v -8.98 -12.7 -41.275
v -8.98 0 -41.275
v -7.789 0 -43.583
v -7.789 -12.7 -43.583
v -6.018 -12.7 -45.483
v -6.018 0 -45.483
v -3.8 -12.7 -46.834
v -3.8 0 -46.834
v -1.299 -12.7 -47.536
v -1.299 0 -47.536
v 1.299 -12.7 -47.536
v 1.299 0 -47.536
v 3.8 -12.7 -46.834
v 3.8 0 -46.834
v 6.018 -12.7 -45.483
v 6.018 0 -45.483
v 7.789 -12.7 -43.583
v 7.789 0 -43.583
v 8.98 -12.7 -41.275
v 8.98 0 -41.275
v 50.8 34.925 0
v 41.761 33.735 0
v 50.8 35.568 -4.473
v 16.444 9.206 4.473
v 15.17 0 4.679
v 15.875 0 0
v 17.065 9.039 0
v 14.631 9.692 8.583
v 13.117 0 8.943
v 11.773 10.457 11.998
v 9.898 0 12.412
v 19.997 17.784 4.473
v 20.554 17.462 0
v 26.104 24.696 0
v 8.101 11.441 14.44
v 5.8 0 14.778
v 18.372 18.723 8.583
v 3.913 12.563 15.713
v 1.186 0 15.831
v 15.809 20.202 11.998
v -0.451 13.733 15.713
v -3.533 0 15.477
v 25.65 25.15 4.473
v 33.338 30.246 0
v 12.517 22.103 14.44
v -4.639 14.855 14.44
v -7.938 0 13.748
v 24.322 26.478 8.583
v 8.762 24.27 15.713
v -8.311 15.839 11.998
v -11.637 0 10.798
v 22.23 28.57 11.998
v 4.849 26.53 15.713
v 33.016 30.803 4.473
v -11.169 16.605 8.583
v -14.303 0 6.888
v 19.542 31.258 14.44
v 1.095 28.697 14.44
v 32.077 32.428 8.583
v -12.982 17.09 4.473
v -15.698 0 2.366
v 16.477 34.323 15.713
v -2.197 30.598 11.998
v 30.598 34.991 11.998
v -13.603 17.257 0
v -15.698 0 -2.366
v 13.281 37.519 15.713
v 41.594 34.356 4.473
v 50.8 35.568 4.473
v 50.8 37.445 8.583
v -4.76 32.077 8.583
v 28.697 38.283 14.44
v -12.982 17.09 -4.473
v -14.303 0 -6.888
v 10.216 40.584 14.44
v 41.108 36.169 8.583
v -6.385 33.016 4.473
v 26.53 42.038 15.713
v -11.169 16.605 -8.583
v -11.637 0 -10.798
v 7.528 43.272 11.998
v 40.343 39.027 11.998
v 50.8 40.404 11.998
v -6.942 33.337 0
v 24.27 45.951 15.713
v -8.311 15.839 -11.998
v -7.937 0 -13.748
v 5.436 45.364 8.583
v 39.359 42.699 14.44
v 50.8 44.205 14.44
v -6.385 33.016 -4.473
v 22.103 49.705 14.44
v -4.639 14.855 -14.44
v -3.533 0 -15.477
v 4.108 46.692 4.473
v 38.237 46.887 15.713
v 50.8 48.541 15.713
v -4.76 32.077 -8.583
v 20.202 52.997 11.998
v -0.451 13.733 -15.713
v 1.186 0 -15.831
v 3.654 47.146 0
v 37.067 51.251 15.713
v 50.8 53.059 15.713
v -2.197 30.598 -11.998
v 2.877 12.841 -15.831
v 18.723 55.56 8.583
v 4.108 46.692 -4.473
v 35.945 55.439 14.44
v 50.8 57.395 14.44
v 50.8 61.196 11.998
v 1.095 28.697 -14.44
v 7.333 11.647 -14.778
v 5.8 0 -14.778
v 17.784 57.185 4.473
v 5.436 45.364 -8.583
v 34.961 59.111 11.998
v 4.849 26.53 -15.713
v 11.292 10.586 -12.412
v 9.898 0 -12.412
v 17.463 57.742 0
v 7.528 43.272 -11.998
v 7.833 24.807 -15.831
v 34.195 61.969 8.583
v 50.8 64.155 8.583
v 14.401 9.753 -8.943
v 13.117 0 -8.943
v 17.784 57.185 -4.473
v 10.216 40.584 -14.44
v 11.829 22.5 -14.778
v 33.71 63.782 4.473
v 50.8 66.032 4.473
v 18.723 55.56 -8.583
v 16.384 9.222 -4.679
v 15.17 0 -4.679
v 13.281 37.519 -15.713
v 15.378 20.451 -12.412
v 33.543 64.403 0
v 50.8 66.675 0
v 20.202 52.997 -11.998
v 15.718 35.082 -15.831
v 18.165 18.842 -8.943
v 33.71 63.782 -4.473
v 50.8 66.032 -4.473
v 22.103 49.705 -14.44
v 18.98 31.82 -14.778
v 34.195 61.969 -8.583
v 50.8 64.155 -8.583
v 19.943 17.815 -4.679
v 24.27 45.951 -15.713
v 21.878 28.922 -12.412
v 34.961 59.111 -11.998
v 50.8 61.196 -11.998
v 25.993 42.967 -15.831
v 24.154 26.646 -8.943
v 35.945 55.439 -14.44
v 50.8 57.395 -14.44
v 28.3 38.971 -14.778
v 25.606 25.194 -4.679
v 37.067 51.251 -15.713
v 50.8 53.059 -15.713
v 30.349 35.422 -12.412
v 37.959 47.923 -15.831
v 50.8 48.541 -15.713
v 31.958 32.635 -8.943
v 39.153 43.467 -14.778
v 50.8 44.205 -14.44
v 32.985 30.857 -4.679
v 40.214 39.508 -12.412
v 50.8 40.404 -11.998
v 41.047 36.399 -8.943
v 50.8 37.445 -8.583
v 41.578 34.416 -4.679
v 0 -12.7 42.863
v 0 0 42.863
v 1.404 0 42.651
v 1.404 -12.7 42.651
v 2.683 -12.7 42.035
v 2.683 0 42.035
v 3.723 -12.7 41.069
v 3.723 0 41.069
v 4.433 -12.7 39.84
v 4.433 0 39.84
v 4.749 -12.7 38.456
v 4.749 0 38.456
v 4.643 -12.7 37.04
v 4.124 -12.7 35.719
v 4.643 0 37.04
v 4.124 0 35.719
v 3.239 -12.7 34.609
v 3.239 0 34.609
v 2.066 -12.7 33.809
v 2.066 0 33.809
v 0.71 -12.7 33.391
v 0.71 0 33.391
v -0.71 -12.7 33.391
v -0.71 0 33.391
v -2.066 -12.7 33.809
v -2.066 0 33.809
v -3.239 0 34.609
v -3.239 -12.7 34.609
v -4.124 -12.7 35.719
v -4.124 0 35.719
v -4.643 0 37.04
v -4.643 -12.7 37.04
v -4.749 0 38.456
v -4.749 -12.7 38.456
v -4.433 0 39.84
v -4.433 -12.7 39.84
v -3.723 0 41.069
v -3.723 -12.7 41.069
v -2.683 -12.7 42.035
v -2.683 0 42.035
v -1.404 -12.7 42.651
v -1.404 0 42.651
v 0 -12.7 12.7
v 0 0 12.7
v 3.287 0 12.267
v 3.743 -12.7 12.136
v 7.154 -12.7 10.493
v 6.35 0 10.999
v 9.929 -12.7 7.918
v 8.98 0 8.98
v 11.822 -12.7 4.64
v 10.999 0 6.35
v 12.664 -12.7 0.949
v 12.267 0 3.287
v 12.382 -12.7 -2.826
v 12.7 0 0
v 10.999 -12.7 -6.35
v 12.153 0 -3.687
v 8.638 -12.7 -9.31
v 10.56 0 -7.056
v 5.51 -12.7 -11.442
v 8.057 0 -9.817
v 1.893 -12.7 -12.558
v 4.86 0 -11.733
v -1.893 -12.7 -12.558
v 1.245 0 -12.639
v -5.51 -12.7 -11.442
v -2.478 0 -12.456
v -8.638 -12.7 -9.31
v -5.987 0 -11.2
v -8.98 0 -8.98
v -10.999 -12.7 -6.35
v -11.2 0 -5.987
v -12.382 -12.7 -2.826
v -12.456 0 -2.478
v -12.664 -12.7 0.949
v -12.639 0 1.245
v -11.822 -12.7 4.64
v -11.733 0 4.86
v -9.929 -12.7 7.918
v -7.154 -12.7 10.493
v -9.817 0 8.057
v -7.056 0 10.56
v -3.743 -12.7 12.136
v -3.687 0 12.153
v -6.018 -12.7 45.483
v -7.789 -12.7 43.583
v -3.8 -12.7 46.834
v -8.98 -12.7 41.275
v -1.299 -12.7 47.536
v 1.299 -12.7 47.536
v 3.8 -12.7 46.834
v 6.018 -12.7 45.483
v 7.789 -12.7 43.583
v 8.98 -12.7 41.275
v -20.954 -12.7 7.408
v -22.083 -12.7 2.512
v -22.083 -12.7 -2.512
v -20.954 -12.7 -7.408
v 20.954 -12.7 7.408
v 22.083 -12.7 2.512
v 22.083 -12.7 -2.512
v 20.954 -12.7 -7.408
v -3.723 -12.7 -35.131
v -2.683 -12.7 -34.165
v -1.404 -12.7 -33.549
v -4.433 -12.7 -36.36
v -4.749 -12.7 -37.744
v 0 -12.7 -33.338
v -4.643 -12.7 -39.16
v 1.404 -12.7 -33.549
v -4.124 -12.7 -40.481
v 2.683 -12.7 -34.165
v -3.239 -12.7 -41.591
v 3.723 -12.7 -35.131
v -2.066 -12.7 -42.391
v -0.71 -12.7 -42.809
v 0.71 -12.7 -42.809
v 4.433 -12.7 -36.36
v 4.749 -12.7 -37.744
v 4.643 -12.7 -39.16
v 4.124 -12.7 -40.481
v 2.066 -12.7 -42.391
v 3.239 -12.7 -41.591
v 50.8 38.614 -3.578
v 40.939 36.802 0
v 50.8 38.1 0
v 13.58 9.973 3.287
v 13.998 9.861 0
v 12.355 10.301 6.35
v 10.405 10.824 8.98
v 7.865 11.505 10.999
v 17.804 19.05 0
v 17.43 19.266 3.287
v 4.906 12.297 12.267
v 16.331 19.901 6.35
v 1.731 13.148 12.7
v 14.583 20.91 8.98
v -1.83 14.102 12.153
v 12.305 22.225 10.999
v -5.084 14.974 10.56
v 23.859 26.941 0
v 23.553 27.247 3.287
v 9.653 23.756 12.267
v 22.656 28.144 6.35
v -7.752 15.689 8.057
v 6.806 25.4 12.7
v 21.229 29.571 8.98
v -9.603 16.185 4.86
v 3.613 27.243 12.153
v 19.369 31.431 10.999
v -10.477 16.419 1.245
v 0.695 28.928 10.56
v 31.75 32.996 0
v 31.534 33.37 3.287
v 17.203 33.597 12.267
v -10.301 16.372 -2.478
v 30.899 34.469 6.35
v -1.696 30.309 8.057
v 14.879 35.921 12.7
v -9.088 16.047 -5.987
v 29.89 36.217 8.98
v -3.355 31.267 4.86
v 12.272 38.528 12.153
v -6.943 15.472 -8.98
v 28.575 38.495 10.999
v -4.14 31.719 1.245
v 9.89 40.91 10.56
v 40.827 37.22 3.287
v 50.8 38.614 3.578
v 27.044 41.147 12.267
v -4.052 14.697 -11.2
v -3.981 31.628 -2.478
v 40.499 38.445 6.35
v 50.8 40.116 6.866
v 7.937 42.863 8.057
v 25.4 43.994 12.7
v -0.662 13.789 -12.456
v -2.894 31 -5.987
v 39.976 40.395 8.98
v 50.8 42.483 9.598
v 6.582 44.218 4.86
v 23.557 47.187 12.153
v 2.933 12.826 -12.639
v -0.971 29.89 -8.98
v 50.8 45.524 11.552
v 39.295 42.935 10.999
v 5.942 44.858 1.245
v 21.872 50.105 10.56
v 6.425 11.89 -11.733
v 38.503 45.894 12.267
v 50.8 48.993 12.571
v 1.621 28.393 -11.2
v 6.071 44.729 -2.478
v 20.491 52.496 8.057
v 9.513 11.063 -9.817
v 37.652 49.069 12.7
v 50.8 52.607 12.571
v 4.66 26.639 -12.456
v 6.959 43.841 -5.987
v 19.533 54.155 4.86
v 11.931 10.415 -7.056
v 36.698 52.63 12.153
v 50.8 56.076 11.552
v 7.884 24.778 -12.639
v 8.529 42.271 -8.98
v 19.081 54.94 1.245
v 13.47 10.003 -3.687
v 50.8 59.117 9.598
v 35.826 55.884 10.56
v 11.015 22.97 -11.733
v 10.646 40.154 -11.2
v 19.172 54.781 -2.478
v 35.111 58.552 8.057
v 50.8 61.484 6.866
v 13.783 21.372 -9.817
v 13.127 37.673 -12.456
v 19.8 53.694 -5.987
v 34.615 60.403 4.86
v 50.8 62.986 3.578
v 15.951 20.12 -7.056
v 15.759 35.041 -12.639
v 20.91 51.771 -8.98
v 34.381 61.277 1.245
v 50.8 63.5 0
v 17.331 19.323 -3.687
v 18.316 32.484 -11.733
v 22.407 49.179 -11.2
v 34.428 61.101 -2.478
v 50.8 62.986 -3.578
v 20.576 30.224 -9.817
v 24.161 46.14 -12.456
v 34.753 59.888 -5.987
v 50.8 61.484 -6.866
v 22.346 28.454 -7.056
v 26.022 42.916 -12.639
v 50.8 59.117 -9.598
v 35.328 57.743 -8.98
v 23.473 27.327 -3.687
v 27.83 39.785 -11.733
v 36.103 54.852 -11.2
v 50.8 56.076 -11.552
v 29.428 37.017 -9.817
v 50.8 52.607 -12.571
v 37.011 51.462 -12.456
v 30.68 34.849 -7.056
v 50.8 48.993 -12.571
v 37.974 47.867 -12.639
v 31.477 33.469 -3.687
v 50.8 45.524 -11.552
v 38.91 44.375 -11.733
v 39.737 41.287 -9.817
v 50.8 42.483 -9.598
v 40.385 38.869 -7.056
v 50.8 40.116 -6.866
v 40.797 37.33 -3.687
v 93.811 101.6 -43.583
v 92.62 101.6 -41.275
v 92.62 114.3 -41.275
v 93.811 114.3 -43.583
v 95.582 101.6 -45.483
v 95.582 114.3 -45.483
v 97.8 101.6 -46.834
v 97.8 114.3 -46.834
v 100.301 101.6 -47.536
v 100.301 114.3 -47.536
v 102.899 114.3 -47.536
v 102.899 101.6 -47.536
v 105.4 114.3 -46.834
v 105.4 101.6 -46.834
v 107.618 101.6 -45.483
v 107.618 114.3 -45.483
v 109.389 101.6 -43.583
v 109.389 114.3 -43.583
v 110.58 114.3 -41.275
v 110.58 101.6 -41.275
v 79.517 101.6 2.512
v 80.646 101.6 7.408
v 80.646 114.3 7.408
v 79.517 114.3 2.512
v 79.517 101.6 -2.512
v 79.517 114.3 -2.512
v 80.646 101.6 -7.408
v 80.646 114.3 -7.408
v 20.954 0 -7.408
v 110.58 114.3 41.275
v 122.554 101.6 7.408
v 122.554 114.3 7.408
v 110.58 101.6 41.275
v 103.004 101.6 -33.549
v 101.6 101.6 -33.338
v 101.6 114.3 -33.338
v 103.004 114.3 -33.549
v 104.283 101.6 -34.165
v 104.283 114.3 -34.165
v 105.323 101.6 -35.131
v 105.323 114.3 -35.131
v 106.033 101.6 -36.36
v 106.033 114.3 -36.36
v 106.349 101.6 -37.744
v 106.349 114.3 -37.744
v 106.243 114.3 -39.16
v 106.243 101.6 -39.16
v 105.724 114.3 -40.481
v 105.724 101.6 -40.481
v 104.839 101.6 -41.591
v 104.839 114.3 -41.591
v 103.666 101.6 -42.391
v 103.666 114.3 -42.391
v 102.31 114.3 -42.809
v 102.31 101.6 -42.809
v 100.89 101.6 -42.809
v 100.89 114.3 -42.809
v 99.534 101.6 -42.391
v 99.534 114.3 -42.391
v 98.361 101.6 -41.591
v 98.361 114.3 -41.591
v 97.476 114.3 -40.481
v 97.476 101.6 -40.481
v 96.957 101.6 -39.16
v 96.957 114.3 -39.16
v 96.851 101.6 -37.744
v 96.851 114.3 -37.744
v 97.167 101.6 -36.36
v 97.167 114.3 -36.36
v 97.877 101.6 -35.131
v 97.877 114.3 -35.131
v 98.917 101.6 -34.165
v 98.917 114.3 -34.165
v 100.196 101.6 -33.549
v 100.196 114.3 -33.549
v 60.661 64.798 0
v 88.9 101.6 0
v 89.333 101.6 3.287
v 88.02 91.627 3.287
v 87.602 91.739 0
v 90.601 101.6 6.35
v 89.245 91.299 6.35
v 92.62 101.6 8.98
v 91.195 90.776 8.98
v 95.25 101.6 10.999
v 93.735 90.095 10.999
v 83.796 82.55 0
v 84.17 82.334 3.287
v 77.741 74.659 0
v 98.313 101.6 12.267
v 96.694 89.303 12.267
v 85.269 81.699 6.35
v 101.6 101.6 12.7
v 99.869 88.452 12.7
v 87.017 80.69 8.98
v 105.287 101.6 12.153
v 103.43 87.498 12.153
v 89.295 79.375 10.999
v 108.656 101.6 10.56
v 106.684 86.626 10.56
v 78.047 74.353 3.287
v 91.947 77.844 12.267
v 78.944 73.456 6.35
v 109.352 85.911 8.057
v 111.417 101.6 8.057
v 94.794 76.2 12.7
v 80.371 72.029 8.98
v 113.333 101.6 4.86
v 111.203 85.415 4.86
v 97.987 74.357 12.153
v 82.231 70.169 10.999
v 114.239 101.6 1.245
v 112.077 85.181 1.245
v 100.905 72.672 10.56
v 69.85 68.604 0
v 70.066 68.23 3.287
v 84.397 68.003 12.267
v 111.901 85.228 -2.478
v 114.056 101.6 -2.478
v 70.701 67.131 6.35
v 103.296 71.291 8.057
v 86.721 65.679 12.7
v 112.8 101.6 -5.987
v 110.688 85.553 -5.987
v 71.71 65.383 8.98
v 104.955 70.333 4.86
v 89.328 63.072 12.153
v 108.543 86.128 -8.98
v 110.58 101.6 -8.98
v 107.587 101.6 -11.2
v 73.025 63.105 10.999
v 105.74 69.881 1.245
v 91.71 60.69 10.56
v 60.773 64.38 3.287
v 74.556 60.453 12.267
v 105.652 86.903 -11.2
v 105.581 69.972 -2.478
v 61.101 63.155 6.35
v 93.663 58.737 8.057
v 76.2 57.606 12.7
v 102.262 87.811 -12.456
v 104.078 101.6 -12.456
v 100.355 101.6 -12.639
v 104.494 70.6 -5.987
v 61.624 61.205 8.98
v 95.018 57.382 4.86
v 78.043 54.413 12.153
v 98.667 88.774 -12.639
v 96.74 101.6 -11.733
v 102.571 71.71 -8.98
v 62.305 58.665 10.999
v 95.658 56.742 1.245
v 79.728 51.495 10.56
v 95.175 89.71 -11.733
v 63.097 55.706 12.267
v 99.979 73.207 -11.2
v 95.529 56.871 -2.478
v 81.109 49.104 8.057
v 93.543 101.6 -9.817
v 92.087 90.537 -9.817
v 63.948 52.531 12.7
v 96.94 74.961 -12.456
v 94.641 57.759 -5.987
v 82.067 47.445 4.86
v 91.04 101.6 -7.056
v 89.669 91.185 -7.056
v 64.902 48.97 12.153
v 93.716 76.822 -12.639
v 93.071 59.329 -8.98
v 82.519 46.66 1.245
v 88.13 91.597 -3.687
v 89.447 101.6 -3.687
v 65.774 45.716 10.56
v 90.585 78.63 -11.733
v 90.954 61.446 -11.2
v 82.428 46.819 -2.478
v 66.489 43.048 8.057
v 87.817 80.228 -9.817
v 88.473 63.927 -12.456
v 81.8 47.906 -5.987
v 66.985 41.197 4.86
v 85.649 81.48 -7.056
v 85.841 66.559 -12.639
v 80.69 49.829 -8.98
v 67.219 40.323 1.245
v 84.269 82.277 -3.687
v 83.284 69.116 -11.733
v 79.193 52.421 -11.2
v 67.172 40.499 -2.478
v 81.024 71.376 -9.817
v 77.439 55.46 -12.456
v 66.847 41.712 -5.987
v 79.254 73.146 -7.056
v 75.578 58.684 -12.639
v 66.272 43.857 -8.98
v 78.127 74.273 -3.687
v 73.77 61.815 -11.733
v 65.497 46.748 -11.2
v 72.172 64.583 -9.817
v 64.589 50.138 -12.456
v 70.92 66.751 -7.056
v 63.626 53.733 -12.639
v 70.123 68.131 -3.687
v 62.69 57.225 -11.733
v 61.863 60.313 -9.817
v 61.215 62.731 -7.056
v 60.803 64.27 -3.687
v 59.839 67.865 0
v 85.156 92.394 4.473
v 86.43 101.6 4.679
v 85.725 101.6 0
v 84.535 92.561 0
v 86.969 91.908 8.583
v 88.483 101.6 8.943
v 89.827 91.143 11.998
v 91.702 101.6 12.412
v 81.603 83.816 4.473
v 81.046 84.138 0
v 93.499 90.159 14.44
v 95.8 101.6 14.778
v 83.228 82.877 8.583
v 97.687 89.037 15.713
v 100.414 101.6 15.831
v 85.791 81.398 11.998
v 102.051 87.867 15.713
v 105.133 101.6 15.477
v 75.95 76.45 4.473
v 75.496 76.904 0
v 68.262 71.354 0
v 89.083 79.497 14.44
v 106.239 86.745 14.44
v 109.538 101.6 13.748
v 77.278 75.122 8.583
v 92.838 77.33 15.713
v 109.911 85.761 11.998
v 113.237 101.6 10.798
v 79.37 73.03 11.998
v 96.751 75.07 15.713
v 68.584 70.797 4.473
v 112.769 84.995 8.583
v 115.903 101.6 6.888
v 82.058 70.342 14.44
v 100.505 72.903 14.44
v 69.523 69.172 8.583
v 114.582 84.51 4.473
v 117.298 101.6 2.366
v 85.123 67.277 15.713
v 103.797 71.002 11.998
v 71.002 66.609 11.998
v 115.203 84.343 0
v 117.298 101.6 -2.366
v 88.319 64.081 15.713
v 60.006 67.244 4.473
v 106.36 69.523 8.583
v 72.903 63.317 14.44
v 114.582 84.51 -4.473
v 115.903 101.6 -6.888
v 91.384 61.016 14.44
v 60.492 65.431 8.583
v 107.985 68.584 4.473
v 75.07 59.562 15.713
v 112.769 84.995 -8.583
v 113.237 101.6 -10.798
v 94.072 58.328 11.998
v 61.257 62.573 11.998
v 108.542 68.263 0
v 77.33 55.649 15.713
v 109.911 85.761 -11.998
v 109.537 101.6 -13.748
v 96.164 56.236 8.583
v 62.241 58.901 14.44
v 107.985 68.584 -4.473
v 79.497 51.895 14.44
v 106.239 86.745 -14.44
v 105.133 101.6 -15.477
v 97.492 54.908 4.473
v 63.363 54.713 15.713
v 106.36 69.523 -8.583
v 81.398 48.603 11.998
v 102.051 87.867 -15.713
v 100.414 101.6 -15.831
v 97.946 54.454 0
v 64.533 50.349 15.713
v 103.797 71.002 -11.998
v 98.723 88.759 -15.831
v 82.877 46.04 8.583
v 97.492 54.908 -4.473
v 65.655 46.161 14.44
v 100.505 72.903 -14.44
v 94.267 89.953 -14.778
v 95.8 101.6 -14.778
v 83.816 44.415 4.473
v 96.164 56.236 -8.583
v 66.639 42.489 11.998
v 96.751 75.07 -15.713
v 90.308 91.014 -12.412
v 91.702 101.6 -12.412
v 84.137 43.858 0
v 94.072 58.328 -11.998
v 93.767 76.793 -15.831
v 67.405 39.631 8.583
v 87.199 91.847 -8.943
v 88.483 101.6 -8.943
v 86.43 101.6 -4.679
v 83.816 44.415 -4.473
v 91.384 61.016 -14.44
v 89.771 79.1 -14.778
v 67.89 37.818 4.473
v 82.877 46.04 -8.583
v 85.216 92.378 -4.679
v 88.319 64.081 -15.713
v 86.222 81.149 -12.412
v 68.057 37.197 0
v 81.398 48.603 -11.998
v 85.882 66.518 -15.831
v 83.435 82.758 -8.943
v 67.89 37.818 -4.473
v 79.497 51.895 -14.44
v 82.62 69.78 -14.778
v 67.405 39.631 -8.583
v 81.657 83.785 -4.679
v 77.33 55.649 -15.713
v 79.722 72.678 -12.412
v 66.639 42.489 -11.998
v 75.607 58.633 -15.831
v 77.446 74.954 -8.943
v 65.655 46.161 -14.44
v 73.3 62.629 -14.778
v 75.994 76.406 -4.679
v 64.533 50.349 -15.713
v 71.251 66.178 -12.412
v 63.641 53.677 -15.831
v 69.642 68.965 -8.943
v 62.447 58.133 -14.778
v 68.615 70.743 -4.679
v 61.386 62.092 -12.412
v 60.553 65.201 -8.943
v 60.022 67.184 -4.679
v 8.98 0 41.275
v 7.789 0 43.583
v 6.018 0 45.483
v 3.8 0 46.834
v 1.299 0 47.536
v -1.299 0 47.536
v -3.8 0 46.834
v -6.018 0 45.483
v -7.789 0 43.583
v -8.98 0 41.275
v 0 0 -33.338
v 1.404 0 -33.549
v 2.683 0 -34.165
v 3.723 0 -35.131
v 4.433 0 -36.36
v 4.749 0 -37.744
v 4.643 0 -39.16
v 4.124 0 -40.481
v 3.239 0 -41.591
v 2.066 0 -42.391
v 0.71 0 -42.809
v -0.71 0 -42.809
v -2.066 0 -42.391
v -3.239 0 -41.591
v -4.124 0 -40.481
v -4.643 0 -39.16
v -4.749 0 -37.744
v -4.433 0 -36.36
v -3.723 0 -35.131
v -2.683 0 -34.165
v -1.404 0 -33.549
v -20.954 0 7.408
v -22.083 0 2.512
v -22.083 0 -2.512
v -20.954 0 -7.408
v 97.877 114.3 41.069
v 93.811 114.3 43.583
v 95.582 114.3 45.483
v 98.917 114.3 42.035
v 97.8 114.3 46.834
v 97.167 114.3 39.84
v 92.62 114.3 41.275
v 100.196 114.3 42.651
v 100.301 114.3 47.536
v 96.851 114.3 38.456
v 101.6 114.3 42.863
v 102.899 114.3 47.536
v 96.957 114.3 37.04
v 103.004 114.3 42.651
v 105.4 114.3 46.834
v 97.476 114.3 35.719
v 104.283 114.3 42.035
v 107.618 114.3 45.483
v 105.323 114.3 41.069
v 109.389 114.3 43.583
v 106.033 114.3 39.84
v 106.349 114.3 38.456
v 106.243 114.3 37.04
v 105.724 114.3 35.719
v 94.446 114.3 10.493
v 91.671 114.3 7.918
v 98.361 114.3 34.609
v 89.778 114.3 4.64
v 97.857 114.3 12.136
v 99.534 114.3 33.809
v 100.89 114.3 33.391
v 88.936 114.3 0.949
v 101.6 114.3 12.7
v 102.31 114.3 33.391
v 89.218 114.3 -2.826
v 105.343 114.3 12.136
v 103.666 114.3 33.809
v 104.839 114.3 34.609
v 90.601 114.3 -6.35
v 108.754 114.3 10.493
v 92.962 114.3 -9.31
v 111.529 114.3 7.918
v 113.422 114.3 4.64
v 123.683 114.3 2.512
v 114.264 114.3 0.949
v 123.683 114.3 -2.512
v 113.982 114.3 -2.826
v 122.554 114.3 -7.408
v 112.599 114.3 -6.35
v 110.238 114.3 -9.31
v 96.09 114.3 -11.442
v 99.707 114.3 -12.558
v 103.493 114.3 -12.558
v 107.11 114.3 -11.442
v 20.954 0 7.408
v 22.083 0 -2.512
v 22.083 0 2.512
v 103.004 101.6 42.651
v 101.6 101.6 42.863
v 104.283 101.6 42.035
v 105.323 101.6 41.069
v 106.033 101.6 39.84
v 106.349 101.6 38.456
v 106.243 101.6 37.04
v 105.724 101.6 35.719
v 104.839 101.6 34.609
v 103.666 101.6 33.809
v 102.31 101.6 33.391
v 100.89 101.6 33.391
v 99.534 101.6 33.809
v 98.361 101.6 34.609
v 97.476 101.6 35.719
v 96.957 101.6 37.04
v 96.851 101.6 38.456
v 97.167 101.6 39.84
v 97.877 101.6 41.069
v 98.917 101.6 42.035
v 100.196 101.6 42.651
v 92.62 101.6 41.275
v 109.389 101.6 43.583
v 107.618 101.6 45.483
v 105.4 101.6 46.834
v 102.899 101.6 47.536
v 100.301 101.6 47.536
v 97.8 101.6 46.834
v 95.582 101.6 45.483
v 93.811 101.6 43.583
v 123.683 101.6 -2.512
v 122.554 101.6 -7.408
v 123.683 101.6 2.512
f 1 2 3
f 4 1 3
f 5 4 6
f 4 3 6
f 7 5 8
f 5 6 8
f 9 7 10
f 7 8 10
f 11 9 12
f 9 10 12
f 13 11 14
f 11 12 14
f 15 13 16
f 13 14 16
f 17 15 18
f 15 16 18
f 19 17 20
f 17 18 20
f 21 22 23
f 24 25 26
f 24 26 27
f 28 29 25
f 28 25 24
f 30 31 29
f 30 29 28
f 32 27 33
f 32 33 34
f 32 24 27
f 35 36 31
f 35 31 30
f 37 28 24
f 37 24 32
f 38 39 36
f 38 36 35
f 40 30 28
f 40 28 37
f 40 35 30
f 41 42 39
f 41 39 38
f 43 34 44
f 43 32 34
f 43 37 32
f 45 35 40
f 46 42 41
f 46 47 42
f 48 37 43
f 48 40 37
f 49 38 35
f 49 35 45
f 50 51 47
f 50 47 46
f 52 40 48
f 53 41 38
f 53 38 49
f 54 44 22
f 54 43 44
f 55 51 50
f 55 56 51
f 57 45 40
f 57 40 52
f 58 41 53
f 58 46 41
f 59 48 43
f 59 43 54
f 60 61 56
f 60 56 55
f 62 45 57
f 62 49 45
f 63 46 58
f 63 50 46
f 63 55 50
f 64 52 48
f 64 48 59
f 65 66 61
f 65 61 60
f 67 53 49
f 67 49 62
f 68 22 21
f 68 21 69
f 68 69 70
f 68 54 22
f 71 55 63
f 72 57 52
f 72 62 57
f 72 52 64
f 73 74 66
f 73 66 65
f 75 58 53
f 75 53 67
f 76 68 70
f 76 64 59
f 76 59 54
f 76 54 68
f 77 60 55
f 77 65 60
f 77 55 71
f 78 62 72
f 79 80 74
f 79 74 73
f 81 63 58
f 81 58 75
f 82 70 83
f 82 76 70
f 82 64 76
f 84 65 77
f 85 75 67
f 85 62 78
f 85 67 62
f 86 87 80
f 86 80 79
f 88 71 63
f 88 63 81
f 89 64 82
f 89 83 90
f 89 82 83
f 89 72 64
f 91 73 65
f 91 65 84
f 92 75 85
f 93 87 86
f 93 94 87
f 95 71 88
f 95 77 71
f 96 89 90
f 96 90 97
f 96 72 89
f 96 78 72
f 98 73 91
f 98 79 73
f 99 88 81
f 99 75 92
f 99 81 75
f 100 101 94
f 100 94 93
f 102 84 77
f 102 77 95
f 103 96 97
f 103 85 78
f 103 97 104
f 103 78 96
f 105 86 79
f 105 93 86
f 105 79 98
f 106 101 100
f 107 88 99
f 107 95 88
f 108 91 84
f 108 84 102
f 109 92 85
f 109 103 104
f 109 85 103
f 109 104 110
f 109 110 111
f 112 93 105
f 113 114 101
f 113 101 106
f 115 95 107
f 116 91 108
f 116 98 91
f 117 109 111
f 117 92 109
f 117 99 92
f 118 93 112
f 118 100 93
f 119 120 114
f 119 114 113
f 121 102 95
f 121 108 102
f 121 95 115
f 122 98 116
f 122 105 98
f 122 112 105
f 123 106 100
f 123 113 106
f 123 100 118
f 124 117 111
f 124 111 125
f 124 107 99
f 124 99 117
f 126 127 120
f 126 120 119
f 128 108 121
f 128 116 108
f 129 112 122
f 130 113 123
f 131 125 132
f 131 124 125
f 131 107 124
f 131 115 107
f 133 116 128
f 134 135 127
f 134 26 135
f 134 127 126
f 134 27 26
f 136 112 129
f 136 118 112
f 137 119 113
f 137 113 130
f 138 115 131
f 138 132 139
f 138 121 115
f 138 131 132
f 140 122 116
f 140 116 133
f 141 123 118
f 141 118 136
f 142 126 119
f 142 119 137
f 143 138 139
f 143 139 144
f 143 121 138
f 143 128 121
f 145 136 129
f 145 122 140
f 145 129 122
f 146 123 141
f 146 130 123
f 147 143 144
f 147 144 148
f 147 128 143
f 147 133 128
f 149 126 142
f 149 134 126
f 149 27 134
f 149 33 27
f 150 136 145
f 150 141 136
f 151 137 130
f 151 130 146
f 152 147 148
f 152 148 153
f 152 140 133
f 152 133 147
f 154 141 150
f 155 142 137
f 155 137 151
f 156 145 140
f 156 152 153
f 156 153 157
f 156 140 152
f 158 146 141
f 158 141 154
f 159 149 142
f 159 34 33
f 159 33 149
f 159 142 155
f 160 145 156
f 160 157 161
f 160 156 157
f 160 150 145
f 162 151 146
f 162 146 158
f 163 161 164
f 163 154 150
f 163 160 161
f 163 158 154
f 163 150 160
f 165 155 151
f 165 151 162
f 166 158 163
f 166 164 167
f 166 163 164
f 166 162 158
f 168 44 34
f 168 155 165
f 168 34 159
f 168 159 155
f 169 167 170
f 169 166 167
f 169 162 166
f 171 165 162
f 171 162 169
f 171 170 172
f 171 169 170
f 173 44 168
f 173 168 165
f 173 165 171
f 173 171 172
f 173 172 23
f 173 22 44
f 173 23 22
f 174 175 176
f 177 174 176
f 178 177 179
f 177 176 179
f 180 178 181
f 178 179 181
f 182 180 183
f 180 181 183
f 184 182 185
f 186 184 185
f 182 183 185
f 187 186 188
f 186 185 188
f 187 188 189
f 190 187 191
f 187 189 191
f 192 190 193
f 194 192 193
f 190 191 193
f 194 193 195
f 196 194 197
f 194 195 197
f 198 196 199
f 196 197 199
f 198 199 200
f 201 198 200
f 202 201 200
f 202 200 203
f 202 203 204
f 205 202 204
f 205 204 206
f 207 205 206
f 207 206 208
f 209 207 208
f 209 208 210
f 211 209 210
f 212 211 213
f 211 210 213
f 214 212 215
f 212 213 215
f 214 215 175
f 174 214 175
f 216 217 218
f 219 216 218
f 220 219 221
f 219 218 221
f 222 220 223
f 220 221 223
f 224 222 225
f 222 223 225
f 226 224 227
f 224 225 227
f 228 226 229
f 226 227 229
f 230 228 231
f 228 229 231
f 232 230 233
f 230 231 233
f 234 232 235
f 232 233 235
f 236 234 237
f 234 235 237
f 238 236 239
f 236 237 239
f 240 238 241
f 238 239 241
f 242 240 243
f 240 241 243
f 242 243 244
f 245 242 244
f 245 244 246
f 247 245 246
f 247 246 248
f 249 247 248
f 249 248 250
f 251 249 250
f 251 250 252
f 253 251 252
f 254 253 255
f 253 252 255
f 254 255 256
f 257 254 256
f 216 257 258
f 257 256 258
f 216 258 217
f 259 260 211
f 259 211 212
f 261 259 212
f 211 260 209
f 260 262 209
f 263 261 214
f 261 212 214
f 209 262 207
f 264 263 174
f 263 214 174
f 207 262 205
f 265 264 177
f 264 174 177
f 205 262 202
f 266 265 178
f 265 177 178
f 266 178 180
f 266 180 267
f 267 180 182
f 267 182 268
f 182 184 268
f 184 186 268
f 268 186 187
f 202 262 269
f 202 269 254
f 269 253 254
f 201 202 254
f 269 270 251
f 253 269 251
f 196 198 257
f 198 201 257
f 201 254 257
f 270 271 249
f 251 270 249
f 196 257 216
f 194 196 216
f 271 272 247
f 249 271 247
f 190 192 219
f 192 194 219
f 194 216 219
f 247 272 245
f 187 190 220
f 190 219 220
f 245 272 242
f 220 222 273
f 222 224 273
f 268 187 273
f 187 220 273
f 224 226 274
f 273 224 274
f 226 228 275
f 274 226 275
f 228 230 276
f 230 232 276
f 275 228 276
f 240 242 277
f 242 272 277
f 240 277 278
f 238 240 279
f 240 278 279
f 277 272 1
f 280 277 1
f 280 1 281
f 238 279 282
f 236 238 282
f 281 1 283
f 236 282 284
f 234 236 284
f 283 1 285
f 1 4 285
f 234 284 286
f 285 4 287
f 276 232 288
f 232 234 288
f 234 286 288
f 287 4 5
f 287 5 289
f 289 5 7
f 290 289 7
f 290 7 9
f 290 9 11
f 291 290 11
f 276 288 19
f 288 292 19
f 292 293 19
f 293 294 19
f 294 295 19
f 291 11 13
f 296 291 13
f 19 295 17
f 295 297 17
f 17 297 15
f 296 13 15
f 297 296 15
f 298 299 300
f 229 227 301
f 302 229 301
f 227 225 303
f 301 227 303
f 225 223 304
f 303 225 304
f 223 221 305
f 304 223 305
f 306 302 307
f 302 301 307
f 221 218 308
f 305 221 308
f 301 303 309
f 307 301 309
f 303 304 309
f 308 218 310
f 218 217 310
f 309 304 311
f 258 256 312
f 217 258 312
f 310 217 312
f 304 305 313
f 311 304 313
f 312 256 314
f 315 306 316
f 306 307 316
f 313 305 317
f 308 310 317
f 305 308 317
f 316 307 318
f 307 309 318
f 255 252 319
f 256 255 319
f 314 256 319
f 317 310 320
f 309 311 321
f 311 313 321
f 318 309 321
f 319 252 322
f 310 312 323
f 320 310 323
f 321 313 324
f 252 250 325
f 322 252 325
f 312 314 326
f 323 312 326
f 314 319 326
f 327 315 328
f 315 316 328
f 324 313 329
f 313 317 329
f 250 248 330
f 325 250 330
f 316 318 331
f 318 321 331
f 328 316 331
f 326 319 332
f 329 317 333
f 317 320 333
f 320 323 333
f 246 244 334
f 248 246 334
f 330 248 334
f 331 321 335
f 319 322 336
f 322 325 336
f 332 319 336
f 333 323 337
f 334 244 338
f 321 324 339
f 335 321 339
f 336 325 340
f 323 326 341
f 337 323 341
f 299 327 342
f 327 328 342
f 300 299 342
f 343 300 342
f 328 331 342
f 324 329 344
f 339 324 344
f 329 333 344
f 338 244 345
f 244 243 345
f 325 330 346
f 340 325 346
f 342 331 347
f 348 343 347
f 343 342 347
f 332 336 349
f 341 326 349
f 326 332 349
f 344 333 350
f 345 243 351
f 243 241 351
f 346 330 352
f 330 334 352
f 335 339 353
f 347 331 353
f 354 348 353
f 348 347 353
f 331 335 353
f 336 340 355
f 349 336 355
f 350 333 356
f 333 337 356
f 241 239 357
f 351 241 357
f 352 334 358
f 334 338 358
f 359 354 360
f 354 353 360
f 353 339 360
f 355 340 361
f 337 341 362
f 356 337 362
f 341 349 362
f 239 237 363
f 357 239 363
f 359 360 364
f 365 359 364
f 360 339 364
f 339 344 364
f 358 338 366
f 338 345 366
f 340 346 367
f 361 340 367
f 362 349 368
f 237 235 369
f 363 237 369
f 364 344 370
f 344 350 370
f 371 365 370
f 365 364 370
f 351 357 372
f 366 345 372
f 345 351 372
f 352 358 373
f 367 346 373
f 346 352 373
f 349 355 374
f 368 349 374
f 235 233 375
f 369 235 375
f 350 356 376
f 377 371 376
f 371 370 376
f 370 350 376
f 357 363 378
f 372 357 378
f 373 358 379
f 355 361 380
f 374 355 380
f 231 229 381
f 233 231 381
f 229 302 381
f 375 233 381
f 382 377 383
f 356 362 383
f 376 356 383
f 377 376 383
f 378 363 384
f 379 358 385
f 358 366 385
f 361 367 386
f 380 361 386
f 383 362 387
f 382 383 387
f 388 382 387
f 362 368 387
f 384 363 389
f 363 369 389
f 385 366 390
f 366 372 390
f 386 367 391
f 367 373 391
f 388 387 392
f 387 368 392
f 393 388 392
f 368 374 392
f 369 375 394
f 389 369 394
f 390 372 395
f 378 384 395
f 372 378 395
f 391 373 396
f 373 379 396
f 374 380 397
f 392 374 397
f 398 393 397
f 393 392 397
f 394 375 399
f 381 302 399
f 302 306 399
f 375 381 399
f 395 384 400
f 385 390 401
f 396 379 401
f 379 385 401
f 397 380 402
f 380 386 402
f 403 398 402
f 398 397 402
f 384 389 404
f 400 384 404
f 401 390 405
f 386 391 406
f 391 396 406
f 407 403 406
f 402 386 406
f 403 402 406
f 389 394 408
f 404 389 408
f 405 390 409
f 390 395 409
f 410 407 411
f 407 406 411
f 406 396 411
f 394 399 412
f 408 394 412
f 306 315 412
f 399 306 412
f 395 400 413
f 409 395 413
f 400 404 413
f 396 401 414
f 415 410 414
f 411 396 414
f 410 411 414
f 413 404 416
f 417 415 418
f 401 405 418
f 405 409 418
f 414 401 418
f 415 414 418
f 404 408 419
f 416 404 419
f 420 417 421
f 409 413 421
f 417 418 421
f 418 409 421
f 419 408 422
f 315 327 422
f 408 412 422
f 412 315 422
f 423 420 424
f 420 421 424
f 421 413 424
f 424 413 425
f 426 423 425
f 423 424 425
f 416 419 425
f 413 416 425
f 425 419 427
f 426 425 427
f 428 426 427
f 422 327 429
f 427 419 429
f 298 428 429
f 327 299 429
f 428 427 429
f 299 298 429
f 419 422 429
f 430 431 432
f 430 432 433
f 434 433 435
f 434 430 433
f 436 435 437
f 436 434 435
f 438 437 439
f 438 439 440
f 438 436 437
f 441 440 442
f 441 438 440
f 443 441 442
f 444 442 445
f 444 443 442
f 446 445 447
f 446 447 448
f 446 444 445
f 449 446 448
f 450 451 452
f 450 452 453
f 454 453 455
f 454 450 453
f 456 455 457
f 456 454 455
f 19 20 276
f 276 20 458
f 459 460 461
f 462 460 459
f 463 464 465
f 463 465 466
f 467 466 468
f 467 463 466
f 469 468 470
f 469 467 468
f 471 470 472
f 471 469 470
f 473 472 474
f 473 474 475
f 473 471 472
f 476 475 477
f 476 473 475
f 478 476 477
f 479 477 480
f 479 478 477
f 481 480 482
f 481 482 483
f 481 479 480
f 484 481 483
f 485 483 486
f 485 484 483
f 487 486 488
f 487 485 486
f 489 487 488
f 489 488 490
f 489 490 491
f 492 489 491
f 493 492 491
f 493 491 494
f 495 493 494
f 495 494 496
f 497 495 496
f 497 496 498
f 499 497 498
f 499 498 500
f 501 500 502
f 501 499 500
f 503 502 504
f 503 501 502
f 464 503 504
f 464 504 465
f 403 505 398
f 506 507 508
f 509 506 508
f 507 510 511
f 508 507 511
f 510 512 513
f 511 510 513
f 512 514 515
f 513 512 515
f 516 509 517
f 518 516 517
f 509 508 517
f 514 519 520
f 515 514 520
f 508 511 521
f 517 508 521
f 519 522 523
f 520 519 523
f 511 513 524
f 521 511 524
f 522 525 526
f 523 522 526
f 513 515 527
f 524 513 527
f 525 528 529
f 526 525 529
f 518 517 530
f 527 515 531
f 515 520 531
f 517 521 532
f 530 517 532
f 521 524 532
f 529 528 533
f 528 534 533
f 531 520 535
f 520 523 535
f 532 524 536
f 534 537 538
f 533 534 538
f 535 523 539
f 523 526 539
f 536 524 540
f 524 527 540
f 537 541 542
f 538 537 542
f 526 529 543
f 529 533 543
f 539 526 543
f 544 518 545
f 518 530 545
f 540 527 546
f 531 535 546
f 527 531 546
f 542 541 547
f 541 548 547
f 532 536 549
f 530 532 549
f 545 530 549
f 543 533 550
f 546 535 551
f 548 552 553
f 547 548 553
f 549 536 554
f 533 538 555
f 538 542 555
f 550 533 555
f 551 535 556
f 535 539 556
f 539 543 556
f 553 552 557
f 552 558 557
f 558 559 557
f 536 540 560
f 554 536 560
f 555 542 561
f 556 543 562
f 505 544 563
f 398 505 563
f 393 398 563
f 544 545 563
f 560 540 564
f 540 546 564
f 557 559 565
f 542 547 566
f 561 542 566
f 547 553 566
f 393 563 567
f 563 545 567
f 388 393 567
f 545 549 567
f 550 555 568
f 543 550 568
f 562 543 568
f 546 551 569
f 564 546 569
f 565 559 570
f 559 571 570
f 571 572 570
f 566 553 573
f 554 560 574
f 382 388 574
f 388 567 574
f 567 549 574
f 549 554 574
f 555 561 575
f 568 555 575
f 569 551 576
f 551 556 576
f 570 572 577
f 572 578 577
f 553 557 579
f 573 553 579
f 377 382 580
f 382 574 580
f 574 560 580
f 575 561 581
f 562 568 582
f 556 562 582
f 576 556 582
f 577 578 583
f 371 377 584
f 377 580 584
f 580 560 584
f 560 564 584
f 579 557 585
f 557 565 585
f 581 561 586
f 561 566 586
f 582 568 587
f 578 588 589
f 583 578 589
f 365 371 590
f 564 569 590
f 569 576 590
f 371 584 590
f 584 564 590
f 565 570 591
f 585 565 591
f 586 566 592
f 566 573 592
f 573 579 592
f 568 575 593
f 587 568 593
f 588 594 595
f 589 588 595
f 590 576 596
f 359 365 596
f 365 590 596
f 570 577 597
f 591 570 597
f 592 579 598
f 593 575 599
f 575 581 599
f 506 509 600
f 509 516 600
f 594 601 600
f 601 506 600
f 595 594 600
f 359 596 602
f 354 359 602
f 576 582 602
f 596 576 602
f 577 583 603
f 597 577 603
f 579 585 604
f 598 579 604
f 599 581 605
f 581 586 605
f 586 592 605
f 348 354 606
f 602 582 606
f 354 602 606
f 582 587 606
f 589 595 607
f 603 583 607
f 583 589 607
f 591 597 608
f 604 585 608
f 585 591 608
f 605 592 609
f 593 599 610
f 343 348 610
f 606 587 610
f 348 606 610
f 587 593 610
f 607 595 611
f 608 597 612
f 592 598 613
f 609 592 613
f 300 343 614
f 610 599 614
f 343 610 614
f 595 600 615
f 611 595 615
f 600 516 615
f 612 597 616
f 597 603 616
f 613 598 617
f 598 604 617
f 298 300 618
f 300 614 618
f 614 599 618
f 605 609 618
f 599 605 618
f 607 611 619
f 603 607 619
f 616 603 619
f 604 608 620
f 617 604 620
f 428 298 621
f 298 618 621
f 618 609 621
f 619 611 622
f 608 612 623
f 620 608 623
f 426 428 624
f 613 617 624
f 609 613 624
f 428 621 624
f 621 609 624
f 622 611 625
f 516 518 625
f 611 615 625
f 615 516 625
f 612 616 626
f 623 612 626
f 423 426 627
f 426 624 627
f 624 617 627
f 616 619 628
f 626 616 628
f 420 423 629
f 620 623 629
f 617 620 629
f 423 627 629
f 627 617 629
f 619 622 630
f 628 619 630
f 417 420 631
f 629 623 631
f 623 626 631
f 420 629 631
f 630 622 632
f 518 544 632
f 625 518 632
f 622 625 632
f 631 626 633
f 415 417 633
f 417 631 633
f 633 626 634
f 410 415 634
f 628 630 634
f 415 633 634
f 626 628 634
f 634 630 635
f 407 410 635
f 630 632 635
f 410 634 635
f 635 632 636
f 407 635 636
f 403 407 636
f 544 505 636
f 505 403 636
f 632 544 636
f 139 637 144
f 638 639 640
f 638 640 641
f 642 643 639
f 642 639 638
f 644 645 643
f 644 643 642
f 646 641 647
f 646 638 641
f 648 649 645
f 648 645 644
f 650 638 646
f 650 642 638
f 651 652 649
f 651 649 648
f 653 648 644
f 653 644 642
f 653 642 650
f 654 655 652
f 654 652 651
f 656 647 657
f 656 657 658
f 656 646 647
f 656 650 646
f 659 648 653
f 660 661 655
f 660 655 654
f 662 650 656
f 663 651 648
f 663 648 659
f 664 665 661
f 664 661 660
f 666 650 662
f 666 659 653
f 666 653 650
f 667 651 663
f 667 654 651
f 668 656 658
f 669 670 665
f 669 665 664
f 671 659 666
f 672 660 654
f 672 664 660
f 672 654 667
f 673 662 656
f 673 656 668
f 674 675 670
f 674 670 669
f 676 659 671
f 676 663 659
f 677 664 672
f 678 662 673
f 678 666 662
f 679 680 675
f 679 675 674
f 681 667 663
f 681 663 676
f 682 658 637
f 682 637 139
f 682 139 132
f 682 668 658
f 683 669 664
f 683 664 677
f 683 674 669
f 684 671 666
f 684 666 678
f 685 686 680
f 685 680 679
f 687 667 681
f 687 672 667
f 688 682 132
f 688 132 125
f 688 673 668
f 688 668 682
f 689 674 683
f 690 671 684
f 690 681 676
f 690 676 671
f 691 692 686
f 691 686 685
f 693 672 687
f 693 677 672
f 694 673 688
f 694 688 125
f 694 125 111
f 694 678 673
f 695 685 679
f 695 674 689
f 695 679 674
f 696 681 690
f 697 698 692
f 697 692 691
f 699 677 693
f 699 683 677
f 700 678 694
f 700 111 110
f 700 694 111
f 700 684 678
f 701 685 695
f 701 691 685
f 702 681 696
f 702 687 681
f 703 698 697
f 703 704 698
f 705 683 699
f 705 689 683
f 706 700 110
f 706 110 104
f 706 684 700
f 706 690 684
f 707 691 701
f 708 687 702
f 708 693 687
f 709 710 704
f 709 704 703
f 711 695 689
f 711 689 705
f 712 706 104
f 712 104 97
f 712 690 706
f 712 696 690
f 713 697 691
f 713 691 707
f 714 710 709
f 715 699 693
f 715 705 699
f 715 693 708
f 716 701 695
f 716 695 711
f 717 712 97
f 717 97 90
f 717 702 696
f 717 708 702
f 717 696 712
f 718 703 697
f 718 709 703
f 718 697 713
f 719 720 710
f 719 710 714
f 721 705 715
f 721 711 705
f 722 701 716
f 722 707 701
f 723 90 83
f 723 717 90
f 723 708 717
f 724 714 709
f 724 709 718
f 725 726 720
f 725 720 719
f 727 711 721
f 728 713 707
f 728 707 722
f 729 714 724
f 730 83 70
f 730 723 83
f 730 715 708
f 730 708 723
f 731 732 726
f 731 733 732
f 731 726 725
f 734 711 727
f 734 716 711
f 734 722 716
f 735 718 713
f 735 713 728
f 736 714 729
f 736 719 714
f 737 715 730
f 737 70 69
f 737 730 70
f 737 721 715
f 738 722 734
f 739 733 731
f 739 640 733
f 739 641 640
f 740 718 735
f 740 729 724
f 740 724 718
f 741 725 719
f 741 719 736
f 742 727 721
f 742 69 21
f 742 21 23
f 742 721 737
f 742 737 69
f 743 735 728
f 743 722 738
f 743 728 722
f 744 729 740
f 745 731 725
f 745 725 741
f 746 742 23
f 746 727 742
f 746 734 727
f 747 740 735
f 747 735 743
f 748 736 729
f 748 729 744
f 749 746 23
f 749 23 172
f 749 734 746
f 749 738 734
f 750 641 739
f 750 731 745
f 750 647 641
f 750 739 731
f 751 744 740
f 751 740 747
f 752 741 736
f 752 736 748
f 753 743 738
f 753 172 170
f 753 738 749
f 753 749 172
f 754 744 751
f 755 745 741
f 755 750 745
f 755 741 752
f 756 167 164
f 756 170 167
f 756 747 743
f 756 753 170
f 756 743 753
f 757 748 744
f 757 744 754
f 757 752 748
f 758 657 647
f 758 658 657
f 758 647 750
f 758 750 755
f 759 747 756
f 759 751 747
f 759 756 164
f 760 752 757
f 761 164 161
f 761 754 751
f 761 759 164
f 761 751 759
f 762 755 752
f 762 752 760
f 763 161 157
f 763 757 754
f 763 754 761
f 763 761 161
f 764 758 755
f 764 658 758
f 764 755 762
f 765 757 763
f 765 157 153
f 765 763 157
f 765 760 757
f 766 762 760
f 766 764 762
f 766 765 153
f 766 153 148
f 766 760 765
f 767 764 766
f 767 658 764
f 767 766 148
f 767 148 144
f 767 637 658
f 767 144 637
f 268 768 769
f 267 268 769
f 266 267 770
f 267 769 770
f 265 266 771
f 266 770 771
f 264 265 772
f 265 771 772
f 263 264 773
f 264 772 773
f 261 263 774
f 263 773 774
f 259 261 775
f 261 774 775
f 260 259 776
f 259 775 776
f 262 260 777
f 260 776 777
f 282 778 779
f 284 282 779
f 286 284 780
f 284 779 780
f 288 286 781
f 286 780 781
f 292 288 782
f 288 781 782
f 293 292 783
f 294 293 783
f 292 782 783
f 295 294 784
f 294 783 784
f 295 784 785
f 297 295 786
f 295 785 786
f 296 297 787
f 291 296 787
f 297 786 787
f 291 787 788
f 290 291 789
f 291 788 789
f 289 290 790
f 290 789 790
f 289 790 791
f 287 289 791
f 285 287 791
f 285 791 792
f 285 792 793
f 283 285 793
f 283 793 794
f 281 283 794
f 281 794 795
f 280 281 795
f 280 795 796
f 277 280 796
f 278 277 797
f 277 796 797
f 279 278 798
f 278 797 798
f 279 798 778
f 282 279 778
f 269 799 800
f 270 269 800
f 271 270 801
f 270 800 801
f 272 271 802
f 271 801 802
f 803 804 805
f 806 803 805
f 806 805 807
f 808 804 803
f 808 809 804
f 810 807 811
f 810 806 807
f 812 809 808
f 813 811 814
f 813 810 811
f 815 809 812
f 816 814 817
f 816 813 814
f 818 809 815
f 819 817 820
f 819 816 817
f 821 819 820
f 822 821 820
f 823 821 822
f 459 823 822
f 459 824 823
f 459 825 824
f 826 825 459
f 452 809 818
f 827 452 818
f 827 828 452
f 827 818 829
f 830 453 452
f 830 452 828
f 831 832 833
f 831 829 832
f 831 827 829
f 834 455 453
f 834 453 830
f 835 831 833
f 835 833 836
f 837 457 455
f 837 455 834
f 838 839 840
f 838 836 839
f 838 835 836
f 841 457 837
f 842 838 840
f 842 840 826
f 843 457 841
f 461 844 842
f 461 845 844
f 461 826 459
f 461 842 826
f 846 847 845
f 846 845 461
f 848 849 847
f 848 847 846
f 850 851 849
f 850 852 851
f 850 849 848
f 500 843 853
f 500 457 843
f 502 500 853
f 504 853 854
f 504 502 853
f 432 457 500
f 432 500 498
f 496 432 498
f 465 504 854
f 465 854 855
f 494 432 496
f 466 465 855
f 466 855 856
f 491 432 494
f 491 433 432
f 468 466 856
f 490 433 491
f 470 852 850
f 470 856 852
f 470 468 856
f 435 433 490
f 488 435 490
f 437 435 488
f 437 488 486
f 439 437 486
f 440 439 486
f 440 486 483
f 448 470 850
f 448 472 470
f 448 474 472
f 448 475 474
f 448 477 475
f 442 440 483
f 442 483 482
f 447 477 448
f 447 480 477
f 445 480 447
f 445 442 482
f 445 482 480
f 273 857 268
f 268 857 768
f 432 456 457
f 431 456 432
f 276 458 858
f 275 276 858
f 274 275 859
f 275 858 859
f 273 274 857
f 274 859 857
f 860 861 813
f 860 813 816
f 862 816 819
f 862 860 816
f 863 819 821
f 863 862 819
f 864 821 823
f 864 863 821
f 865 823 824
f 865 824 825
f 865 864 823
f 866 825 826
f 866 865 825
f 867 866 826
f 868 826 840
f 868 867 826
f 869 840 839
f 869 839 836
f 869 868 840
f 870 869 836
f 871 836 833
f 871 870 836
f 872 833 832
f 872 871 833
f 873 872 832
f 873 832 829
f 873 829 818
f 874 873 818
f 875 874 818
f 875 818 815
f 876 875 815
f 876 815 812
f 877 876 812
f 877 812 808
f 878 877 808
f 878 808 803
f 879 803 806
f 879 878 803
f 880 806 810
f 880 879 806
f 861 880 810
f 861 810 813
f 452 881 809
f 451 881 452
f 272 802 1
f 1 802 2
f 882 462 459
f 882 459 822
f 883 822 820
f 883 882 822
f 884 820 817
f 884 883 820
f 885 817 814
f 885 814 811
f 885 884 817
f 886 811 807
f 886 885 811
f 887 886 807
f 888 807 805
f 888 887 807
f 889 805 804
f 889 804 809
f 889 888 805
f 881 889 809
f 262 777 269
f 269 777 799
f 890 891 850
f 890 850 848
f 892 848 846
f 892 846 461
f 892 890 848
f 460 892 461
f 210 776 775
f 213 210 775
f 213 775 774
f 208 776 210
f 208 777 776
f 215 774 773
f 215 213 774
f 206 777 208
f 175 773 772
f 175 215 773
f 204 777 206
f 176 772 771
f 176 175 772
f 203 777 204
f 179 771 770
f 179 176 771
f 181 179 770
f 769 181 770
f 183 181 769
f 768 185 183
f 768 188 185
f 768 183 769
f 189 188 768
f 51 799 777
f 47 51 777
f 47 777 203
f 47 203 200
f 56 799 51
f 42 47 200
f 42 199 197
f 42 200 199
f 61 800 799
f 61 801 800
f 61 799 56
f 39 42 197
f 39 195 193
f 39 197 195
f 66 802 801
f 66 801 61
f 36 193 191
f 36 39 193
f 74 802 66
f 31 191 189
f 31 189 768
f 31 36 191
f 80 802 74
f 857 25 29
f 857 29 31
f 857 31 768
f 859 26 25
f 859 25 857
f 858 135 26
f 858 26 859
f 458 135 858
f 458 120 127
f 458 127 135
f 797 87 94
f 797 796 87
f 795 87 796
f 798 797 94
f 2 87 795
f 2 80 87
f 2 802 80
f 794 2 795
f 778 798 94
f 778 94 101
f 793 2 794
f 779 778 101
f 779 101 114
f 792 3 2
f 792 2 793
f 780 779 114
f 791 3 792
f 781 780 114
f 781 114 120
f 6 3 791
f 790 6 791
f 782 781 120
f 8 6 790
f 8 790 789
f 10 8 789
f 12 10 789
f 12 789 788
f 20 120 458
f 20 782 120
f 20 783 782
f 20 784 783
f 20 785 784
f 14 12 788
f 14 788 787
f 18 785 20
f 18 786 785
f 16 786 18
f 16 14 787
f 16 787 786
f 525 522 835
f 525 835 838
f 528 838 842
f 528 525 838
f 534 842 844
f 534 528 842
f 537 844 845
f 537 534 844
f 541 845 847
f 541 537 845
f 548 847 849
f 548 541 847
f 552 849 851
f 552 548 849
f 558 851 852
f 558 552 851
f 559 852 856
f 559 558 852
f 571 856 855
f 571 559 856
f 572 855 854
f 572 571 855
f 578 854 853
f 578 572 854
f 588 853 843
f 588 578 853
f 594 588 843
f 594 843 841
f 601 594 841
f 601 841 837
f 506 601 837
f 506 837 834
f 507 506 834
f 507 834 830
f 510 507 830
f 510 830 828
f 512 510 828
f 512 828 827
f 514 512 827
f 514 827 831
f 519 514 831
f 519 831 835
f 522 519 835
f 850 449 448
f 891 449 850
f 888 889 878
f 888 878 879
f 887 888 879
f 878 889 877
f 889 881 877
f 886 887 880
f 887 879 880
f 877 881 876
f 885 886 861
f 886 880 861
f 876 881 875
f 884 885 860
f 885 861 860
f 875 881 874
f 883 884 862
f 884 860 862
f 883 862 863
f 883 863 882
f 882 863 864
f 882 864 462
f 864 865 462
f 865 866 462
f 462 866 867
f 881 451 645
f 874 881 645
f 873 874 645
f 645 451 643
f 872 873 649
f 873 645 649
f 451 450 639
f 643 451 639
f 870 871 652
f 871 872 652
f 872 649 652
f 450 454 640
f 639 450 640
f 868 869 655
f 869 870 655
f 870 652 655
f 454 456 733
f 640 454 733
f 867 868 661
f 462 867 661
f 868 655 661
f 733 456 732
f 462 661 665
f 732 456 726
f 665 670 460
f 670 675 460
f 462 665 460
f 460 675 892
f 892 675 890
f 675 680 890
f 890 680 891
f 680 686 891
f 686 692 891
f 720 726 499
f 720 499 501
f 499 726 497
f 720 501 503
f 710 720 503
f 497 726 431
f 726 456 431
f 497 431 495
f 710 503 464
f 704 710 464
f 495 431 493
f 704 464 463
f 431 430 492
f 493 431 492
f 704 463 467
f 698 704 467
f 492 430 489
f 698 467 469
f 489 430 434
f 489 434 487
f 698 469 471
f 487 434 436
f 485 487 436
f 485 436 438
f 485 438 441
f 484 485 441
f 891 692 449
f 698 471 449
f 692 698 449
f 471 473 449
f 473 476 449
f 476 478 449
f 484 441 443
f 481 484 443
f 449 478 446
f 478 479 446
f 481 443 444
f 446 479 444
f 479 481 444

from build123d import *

# Parameters (mm, degrees)
SKETCH1_R               = 4.7625
SKETCH1_R_2             = 12.7
BOSS_EXTRUDE1_DEPTH     = 12.7
SKETCH2_R               = 4.7625
SKETCH2_R_2             = 12.7
BOSS_EXTRUDE2_DEPTH     = 12.7
SWEEP_THIN1_PROFILE_R   = 15.875
SWEEP_THIN1_PROFILE_R_2 = 12.7
SWEEP_THIN2_PROFILE_R   = 15.875
SWEEP_THIN2_PROFILE_R_2 = 12.7


with BuildPart() as part:
    # Sketch1 → Boss-Extrude1 (new body)
    with BuildSketch(Plane(origin=(0, 0, 0), x_dir=(1, 0, 0), z_dir=(0, 1, 0))):
        with BuildLine():
            ThreePointArc((-8.980256121, -41.275), (0, -47.625), (8.980256121, -41.275))
            Line((8.980256121, -41.275), (20.953930949, -7.408333333))
            ThreePointArc((20.953930949, -7.408333333), (22.225, 0), (20.953930949, 7.408333333))
            Line((20.953930949, 7.408333333), (8.980256121, 41.275))
            ThreePointArc((8.980256121, 41.275), (0, 47.625), (-8.980256121, 41.275))
            Line((-8.980256121, 41.275), (-20.953930949, 7.408333333))
            ThreePointArc((-20.953930949, 7.408333333), (-22.225, 0), (-20.953930949, -7.408333333))
            Line((-20.953930949, -7.408333333), (-8.980256121, -41.275))
        make_face()
        with Locations((0, -38.1)):
            Circle(SKETCH1_R, mode=Mode.SUBTRACT)
        with Locations((0, 38.1)):
            Circle(SKETCH1_R, mode=Mode.SUBTRACT)
        Circle(SKETCH1_R_2, mode=Mode.SUBTRACT)
    extrude(amount=-BOSS_EXTRUDE1_DEPTH)

    # Sweep-Thin1: sweep along a path in Sketch3
    with BuildLine(Plane.XY) as sweep_thin1_path:
        ThreePointArc((0, 0), (14.878975516, 35.921024484), (50.8, 50.8))
    # Sweep-Thin1 profile (on start of the path) → Sweep-Thin1 (sweep)
    with BuildSketch(Plane(origin=(0, 0, 0), x_dir=(1, 0, 0), z_dir=(0, 1, 0))):
        Circle(SWEEP_THIN1_PROFILE_R)
        Circle(SWEEP_THIN1_PROFILE_R_2, mode=Mode.SUBTRACT)
    sweep(path=sweep_thin1_path.line)



with BuildPart() as body_2:
    # Sketch2 → Boss-Extrude2 (new body)
    with BuildSketch(Plane(origin=(0, 101.6, 0), x_dir=(1, 0, 0), z_dir=(0, 1, 0))):
        with BuildLine():
            ThreePointArc((92.619743879, -41.275), (101.6, -47.625), (110.580256121, -41.275))
            Line((110.580256121, -41.275), (122.553930949, -7.408333333))
            ThreePointArc((122.553930949, -7.408333333), (123.825, 0), (122.553930949, 7.408333333))
            Line((122.553930949, 7.408333333), (110.580256121, 41.275))
            ThreePointArc((110.580256121, 41.275), (101.6, 47.625), (92.619743879, 41.275))
            Line((92.619743879, 41.275), (80.646069051, 7.408333333))
            ThreePointArc((80.646069051, 7.408333333), (79.375, 0), (80.646069051, -7.408333333))
            Line((80.646069051, -7.408333333), (92.619743879, -41.275))
        make_face()
        with Locations((101.6, -38.1)):
            Circle(SKETCH2_R, mode=Mode.SUBTRACT)
        with Locations((101.6, 38.1)):
            Circle(SKETCH2_R, mode=Mode.SUBTRACT)
        with Locations((101.6, 0)):
            Circle(SKETCH2_R_2, mode=Mode.SUBTRACT)
    extrude(amount=BOSS_EXTRUDE2_DEPTH)


with BuildPart() as part_1:
    add(part.part)

    add(body_2.part)  # Sweep-Thin2 merges body 2
    # Sweep-Thin2: sweep along a path in Sketch25
    with BuildLine(Plane.XY) as sweep_thin2_path:
        ThreePointArc((101.6, 101.6), (86.721024484, 65.678975516), (50.8, 50.8))
    # Sweep-Thin2 profile (on start of the path) → Sweep-Thin2 (sweep)
    with BuildSketch(Plane(origin=(101.6, 101.6, 0), x_dir=(-1, 0, 0), z_dir=(0, -1, 0))):
        Circle(SWEEP_THIN2_PROFILE_R)
        Circle(SWEEP_THIN2_PROFILE_R_2, mode=Mode.SUBTRACT)
    sweep(path=sweep_thin2_path.line)


solid = part_1.part
